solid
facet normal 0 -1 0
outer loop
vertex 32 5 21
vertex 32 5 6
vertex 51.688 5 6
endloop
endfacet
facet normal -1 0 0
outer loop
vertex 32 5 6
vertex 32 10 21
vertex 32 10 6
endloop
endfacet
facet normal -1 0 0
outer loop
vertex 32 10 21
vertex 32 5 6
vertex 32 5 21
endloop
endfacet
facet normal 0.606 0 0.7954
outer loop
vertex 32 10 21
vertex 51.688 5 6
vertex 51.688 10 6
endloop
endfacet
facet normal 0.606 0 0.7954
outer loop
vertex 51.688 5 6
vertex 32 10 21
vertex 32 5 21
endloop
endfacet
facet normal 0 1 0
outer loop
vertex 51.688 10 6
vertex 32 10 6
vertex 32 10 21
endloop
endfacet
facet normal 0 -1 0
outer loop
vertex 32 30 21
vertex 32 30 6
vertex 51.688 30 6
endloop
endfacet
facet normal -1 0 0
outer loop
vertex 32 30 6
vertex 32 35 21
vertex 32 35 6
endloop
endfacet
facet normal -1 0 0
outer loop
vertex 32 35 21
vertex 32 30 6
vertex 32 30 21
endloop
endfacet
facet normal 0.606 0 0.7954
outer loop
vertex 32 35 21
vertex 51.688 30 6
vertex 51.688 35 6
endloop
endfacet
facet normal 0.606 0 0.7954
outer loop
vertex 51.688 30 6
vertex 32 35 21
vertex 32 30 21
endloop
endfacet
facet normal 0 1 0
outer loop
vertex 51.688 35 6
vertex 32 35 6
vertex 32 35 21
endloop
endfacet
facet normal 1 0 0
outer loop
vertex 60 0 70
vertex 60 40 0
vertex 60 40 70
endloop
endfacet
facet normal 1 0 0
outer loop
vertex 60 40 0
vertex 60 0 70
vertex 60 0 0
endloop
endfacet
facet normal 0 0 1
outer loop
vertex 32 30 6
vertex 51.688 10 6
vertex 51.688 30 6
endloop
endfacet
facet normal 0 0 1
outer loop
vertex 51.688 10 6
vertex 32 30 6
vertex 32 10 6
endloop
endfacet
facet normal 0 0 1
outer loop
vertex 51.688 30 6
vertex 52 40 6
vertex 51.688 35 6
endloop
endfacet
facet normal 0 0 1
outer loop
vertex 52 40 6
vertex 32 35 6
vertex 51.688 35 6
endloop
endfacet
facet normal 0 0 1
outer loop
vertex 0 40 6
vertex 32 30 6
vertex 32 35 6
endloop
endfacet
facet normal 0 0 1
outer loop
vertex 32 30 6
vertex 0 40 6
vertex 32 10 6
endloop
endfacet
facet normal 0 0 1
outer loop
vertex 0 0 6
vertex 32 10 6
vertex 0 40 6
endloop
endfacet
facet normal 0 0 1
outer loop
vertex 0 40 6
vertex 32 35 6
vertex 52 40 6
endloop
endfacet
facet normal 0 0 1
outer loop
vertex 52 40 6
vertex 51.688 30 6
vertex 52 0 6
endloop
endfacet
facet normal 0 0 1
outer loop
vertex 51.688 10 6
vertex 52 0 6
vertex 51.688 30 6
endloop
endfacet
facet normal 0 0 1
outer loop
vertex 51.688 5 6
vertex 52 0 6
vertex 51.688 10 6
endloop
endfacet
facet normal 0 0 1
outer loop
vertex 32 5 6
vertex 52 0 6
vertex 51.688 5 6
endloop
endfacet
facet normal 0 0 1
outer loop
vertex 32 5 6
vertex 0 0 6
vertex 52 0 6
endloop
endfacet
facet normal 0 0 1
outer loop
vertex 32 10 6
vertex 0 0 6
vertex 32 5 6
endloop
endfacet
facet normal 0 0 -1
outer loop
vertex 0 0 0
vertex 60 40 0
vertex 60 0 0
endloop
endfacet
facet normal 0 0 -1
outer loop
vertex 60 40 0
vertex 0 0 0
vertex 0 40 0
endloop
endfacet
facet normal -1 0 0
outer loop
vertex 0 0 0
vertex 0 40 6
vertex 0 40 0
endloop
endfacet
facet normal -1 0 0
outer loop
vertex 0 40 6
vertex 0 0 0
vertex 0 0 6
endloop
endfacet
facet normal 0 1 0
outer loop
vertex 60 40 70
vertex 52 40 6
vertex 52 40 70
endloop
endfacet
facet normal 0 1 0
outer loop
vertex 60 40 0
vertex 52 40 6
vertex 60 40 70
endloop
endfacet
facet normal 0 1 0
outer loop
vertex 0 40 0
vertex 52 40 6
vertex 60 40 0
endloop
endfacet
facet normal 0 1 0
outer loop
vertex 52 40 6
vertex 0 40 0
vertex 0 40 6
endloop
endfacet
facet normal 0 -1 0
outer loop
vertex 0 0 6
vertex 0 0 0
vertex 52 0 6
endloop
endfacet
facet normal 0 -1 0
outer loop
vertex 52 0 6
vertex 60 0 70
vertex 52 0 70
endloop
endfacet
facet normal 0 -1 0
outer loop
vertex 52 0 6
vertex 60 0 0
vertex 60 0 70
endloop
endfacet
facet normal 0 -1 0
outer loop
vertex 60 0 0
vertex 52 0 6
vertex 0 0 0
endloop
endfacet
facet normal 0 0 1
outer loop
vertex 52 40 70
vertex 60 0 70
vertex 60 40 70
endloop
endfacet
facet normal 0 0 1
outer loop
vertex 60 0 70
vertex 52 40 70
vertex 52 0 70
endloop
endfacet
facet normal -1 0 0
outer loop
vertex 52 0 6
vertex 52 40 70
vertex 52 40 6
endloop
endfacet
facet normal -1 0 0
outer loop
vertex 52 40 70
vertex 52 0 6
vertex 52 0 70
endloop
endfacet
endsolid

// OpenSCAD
$fn = 32;

// ----------------------------------------------------------------------
// Rib bracket: 2-gusset L bracket
// ----------------------------------------------------------------------

// --- parameters (mm) ---
base_l = 60;              // foot length, X
base_w = 40;              // foot width, Y
base_t = 6;               // foot thickness
plate_t = 8;              // upright plate thickness
plate_h = 70;             // overall height
gus_l = 20;               // gusset leg along the foot
gus_h = 16;               // gusset height
gus_t = 5;                // gusset thickness
gus_edge = 5;             // gusset margin from the foot edge
n_gus = 2;                // gusset count

gus_pitch = (base_w - 2 * gus_edge - gus_t) / (n_gus - 1);  // gusset pitch

union() {
  cube([base_l, base_w, base_t]);
  translate([base_l - plate_t, 0, base_t - 1])
    cube([plate_t, base_w, plate_h - base_t + 1]);
  for (i = [0 : n_gus - 1])
    translate([base_l - plate_t - gus_l, gus_edge + i * gus_pitch, base_t - 1])
      rotate([-90, 0, 0])
        linear_extrude(height = gus_t)
          polygon(points = [[0, 0], [gus_l + 1, 0], [0, -gus_h]]);
}
